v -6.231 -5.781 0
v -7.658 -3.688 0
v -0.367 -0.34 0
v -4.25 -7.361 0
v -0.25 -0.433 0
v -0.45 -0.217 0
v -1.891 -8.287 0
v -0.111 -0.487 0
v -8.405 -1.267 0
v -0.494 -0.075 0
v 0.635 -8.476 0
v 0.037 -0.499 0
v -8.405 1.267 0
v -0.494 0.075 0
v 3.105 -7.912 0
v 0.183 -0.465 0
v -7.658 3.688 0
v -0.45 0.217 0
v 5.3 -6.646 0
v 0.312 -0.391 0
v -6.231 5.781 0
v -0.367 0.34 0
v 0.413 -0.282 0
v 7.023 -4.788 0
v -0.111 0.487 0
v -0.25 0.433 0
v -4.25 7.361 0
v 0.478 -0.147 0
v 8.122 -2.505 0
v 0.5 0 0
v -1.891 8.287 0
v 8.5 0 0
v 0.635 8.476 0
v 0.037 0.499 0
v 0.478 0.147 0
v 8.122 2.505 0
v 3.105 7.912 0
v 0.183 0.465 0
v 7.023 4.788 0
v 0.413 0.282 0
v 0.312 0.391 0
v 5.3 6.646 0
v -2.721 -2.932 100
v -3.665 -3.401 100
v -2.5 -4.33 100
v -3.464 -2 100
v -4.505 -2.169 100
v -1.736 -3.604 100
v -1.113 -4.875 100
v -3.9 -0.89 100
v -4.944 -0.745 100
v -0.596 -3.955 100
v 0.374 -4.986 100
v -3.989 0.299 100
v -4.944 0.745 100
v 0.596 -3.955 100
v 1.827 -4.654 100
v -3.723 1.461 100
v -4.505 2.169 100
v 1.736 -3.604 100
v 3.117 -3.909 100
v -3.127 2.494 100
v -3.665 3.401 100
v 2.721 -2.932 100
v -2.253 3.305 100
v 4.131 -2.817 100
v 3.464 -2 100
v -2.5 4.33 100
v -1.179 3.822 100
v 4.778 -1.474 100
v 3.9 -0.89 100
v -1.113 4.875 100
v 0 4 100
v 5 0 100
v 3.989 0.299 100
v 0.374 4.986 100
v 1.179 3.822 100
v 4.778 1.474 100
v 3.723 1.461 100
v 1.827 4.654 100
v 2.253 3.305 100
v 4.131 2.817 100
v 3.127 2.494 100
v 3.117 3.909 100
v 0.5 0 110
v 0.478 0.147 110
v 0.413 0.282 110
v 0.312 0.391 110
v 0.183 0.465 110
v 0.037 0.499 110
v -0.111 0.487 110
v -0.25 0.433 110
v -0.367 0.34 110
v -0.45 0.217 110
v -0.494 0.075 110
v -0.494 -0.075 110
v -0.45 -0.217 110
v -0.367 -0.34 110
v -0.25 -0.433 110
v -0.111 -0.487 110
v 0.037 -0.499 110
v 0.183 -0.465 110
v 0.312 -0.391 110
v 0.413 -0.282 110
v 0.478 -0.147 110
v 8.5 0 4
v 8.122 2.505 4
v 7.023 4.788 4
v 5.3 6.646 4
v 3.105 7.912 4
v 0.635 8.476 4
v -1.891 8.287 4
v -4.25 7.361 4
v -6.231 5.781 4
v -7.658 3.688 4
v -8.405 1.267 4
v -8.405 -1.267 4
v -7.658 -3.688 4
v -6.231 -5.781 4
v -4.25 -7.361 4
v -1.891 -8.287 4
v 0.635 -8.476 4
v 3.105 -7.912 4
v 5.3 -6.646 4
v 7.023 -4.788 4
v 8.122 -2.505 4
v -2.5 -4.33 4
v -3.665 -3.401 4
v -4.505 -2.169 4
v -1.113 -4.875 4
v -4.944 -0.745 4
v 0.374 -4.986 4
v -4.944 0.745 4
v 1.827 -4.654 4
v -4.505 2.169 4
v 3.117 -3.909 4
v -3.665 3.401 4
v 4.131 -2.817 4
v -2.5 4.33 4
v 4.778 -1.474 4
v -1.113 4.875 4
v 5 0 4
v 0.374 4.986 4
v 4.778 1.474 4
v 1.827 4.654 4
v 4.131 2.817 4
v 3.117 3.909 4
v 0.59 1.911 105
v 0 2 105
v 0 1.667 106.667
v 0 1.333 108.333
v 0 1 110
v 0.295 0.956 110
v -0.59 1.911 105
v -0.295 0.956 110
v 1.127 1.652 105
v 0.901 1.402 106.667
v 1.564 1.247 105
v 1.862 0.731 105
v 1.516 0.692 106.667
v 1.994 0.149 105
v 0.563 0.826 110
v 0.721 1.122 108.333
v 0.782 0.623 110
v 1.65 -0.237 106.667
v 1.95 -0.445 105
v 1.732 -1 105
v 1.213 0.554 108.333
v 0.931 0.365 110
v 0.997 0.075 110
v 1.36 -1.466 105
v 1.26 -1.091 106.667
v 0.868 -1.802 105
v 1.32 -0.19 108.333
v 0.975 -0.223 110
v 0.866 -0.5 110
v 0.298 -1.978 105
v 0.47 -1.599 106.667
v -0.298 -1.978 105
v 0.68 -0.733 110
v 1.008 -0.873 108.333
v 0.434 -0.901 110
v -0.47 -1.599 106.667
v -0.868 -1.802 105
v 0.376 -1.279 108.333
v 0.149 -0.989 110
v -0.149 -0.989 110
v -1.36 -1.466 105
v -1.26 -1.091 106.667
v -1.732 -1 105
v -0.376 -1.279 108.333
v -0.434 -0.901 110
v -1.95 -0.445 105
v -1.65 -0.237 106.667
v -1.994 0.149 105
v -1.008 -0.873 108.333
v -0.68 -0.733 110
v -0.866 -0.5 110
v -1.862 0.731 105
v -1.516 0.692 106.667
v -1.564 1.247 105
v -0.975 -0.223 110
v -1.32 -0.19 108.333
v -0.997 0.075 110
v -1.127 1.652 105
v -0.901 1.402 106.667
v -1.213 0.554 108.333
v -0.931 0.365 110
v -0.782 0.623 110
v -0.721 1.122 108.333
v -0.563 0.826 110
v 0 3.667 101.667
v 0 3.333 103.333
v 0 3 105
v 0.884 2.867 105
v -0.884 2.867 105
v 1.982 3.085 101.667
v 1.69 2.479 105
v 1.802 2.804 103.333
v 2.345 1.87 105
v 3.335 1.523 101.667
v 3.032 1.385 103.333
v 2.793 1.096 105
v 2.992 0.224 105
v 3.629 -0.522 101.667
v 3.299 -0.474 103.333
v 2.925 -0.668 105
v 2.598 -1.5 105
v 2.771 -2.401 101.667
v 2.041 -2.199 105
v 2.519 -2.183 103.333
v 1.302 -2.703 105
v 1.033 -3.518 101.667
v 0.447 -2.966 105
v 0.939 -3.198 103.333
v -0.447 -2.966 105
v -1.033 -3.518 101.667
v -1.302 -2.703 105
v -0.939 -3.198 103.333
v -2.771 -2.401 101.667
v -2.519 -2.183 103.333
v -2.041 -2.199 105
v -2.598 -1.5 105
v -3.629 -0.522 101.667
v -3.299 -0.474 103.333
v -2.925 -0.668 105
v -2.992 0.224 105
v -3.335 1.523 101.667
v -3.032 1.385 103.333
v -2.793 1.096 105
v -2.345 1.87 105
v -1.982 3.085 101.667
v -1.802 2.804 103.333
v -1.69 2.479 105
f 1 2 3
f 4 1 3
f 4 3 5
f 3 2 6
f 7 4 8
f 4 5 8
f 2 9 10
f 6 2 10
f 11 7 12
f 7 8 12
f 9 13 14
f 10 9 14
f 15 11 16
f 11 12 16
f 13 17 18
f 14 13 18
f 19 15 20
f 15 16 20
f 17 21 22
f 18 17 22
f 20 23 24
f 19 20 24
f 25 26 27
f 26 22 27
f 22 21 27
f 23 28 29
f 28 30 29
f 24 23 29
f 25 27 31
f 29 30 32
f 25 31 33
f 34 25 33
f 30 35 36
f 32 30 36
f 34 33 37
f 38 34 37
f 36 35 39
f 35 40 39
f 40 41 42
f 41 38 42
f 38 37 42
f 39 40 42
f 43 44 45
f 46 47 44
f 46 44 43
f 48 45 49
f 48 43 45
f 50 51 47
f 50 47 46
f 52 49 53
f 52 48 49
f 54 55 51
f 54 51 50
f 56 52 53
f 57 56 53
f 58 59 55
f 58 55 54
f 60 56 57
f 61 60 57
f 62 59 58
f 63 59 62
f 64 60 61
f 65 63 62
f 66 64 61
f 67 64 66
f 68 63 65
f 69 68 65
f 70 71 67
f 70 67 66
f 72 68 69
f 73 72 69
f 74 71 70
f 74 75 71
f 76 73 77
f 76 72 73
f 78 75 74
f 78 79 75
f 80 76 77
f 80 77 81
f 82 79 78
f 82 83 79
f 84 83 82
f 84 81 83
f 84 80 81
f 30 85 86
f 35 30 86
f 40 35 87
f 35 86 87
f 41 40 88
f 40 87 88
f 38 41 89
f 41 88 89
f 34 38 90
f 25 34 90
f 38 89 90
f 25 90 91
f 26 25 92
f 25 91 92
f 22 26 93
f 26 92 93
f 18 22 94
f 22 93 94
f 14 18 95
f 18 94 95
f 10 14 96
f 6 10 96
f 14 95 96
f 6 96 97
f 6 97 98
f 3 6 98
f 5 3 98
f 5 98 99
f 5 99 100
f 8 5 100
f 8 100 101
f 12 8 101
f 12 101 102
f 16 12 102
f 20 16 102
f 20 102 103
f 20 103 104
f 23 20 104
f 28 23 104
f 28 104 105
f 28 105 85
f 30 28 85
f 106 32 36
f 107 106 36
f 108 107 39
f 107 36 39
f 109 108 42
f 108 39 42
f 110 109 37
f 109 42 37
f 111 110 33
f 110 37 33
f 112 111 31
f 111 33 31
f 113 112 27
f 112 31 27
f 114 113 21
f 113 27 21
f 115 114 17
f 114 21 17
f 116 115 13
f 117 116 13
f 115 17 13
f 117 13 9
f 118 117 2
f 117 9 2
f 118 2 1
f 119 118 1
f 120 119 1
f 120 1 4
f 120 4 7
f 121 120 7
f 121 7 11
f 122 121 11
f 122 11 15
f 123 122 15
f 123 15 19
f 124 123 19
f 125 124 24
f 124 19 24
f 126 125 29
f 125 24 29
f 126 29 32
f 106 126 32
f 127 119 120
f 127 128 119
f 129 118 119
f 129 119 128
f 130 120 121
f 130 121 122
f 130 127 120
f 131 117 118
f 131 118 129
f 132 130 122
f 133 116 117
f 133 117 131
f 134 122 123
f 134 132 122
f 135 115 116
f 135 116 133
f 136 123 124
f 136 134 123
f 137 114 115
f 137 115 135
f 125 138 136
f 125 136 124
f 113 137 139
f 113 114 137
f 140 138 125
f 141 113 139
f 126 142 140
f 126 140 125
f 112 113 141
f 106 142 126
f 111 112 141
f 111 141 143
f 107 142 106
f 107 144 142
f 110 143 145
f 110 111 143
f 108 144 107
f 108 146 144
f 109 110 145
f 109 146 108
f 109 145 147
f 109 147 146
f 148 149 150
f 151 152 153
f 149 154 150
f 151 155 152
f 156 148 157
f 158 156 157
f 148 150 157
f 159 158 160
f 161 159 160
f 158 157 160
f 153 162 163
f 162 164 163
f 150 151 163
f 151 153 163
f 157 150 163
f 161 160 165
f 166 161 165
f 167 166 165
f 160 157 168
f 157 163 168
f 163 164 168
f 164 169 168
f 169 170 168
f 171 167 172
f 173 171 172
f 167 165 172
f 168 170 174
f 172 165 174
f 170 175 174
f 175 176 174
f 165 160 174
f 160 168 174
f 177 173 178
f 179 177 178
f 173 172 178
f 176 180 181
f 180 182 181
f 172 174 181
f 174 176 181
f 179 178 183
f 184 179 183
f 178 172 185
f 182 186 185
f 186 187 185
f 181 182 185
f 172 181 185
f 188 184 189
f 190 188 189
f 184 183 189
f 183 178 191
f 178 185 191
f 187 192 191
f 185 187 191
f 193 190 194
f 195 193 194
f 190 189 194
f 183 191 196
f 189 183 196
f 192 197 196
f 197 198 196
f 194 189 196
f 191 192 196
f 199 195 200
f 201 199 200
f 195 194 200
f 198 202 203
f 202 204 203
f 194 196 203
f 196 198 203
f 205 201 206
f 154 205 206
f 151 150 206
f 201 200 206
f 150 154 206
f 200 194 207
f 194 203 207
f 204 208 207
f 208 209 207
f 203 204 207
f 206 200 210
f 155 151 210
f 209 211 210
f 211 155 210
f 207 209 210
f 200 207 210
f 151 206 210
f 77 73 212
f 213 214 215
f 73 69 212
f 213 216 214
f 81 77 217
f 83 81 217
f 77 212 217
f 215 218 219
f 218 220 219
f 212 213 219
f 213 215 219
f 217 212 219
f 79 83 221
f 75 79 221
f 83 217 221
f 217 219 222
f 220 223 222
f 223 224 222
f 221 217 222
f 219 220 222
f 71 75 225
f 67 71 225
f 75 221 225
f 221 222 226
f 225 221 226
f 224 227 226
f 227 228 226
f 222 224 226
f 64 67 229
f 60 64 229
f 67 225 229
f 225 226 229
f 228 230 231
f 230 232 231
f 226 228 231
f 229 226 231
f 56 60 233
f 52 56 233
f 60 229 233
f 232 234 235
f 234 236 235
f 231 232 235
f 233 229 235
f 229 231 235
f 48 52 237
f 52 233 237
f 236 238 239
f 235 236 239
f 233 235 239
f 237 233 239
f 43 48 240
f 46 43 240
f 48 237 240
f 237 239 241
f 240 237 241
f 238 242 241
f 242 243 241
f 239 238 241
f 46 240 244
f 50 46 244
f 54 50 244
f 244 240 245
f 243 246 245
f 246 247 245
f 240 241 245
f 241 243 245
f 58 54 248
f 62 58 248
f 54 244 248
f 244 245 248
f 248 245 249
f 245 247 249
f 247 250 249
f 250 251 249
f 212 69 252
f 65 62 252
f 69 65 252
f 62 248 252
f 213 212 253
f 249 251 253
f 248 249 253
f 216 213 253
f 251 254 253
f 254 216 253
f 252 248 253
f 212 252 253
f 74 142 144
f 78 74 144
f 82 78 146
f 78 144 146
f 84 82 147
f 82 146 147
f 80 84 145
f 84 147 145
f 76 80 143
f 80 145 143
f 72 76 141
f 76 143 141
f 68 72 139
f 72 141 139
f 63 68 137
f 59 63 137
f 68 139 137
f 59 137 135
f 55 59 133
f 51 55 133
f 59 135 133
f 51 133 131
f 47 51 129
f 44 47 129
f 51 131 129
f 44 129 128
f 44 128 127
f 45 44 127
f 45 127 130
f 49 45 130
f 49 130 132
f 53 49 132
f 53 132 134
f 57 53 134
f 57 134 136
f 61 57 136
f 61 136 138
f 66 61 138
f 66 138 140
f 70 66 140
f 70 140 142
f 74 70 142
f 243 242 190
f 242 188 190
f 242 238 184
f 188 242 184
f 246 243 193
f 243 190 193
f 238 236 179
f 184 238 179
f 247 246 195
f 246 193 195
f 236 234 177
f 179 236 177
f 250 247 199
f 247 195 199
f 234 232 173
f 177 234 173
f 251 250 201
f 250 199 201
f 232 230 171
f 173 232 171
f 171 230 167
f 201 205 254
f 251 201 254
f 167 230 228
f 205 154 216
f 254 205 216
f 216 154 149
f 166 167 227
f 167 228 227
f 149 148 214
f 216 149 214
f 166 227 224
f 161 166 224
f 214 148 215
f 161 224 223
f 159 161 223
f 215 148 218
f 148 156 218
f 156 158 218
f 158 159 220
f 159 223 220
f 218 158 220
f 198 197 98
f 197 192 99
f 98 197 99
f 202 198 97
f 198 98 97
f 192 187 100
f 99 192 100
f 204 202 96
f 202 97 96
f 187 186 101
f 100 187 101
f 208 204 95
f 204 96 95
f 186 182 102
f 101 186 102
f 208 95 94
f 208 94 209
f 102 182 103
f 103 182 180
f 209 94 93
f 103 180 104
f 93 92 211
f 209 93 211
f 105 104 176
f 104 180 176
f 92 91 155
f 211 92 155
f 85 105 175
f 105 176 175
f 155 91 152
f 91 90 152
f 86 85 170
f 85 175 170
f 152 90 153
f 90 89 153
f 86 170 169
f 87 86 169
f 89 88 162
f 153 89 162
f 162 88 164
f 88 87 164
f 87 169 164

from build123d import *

# Parameters (mm, degrees)
F0_R     = 8.5
F1_DEPTH = 4
F2_R     = 5
F3_DEPTH = 100
F8_R     = 0.5
F9_DEPTH = 125.6


with BuildPart() as f1:
    # F0 (on Top) → F1 (new body)
    with BuildSketch(Plane.XY):
        Circle(F0_R)
    extrude(amount=F1_DEPTH)

    # F2 (on Top) → F3 (join)
    with BuildSketch(Plane.XY):
        Circle(F2_R)
    extrude(amount=F3_DEPTH)

    # F4 (on Right) → F5 (revolve)
    with BuildSketch(Plane.YZ):
        Polygon((3, 105), (0, 105), (0, 100), (4, 100), align=None)
    revolve(axis=Axis((0, 0, 102.5), (0, 0, -1)))

    # F6 (on Right) → F7 (revolve)
    with BuildSketch(Plane.YZ):
        Polygon((1, 110), (0, 110), (0, 105), (2, 105), align=None)
    revolve(axis=Axis((0, 0, 107.5), (0, 0, -1)))

    # F8 (on face) → F9 (cut)
    with BuildSketch(Plane.XY.offset(110)):
        Circle(F8_R)
    extrude(amount=-F9_DEPTH, mode=Mode.SUBTRACT)


solid = f1.part
